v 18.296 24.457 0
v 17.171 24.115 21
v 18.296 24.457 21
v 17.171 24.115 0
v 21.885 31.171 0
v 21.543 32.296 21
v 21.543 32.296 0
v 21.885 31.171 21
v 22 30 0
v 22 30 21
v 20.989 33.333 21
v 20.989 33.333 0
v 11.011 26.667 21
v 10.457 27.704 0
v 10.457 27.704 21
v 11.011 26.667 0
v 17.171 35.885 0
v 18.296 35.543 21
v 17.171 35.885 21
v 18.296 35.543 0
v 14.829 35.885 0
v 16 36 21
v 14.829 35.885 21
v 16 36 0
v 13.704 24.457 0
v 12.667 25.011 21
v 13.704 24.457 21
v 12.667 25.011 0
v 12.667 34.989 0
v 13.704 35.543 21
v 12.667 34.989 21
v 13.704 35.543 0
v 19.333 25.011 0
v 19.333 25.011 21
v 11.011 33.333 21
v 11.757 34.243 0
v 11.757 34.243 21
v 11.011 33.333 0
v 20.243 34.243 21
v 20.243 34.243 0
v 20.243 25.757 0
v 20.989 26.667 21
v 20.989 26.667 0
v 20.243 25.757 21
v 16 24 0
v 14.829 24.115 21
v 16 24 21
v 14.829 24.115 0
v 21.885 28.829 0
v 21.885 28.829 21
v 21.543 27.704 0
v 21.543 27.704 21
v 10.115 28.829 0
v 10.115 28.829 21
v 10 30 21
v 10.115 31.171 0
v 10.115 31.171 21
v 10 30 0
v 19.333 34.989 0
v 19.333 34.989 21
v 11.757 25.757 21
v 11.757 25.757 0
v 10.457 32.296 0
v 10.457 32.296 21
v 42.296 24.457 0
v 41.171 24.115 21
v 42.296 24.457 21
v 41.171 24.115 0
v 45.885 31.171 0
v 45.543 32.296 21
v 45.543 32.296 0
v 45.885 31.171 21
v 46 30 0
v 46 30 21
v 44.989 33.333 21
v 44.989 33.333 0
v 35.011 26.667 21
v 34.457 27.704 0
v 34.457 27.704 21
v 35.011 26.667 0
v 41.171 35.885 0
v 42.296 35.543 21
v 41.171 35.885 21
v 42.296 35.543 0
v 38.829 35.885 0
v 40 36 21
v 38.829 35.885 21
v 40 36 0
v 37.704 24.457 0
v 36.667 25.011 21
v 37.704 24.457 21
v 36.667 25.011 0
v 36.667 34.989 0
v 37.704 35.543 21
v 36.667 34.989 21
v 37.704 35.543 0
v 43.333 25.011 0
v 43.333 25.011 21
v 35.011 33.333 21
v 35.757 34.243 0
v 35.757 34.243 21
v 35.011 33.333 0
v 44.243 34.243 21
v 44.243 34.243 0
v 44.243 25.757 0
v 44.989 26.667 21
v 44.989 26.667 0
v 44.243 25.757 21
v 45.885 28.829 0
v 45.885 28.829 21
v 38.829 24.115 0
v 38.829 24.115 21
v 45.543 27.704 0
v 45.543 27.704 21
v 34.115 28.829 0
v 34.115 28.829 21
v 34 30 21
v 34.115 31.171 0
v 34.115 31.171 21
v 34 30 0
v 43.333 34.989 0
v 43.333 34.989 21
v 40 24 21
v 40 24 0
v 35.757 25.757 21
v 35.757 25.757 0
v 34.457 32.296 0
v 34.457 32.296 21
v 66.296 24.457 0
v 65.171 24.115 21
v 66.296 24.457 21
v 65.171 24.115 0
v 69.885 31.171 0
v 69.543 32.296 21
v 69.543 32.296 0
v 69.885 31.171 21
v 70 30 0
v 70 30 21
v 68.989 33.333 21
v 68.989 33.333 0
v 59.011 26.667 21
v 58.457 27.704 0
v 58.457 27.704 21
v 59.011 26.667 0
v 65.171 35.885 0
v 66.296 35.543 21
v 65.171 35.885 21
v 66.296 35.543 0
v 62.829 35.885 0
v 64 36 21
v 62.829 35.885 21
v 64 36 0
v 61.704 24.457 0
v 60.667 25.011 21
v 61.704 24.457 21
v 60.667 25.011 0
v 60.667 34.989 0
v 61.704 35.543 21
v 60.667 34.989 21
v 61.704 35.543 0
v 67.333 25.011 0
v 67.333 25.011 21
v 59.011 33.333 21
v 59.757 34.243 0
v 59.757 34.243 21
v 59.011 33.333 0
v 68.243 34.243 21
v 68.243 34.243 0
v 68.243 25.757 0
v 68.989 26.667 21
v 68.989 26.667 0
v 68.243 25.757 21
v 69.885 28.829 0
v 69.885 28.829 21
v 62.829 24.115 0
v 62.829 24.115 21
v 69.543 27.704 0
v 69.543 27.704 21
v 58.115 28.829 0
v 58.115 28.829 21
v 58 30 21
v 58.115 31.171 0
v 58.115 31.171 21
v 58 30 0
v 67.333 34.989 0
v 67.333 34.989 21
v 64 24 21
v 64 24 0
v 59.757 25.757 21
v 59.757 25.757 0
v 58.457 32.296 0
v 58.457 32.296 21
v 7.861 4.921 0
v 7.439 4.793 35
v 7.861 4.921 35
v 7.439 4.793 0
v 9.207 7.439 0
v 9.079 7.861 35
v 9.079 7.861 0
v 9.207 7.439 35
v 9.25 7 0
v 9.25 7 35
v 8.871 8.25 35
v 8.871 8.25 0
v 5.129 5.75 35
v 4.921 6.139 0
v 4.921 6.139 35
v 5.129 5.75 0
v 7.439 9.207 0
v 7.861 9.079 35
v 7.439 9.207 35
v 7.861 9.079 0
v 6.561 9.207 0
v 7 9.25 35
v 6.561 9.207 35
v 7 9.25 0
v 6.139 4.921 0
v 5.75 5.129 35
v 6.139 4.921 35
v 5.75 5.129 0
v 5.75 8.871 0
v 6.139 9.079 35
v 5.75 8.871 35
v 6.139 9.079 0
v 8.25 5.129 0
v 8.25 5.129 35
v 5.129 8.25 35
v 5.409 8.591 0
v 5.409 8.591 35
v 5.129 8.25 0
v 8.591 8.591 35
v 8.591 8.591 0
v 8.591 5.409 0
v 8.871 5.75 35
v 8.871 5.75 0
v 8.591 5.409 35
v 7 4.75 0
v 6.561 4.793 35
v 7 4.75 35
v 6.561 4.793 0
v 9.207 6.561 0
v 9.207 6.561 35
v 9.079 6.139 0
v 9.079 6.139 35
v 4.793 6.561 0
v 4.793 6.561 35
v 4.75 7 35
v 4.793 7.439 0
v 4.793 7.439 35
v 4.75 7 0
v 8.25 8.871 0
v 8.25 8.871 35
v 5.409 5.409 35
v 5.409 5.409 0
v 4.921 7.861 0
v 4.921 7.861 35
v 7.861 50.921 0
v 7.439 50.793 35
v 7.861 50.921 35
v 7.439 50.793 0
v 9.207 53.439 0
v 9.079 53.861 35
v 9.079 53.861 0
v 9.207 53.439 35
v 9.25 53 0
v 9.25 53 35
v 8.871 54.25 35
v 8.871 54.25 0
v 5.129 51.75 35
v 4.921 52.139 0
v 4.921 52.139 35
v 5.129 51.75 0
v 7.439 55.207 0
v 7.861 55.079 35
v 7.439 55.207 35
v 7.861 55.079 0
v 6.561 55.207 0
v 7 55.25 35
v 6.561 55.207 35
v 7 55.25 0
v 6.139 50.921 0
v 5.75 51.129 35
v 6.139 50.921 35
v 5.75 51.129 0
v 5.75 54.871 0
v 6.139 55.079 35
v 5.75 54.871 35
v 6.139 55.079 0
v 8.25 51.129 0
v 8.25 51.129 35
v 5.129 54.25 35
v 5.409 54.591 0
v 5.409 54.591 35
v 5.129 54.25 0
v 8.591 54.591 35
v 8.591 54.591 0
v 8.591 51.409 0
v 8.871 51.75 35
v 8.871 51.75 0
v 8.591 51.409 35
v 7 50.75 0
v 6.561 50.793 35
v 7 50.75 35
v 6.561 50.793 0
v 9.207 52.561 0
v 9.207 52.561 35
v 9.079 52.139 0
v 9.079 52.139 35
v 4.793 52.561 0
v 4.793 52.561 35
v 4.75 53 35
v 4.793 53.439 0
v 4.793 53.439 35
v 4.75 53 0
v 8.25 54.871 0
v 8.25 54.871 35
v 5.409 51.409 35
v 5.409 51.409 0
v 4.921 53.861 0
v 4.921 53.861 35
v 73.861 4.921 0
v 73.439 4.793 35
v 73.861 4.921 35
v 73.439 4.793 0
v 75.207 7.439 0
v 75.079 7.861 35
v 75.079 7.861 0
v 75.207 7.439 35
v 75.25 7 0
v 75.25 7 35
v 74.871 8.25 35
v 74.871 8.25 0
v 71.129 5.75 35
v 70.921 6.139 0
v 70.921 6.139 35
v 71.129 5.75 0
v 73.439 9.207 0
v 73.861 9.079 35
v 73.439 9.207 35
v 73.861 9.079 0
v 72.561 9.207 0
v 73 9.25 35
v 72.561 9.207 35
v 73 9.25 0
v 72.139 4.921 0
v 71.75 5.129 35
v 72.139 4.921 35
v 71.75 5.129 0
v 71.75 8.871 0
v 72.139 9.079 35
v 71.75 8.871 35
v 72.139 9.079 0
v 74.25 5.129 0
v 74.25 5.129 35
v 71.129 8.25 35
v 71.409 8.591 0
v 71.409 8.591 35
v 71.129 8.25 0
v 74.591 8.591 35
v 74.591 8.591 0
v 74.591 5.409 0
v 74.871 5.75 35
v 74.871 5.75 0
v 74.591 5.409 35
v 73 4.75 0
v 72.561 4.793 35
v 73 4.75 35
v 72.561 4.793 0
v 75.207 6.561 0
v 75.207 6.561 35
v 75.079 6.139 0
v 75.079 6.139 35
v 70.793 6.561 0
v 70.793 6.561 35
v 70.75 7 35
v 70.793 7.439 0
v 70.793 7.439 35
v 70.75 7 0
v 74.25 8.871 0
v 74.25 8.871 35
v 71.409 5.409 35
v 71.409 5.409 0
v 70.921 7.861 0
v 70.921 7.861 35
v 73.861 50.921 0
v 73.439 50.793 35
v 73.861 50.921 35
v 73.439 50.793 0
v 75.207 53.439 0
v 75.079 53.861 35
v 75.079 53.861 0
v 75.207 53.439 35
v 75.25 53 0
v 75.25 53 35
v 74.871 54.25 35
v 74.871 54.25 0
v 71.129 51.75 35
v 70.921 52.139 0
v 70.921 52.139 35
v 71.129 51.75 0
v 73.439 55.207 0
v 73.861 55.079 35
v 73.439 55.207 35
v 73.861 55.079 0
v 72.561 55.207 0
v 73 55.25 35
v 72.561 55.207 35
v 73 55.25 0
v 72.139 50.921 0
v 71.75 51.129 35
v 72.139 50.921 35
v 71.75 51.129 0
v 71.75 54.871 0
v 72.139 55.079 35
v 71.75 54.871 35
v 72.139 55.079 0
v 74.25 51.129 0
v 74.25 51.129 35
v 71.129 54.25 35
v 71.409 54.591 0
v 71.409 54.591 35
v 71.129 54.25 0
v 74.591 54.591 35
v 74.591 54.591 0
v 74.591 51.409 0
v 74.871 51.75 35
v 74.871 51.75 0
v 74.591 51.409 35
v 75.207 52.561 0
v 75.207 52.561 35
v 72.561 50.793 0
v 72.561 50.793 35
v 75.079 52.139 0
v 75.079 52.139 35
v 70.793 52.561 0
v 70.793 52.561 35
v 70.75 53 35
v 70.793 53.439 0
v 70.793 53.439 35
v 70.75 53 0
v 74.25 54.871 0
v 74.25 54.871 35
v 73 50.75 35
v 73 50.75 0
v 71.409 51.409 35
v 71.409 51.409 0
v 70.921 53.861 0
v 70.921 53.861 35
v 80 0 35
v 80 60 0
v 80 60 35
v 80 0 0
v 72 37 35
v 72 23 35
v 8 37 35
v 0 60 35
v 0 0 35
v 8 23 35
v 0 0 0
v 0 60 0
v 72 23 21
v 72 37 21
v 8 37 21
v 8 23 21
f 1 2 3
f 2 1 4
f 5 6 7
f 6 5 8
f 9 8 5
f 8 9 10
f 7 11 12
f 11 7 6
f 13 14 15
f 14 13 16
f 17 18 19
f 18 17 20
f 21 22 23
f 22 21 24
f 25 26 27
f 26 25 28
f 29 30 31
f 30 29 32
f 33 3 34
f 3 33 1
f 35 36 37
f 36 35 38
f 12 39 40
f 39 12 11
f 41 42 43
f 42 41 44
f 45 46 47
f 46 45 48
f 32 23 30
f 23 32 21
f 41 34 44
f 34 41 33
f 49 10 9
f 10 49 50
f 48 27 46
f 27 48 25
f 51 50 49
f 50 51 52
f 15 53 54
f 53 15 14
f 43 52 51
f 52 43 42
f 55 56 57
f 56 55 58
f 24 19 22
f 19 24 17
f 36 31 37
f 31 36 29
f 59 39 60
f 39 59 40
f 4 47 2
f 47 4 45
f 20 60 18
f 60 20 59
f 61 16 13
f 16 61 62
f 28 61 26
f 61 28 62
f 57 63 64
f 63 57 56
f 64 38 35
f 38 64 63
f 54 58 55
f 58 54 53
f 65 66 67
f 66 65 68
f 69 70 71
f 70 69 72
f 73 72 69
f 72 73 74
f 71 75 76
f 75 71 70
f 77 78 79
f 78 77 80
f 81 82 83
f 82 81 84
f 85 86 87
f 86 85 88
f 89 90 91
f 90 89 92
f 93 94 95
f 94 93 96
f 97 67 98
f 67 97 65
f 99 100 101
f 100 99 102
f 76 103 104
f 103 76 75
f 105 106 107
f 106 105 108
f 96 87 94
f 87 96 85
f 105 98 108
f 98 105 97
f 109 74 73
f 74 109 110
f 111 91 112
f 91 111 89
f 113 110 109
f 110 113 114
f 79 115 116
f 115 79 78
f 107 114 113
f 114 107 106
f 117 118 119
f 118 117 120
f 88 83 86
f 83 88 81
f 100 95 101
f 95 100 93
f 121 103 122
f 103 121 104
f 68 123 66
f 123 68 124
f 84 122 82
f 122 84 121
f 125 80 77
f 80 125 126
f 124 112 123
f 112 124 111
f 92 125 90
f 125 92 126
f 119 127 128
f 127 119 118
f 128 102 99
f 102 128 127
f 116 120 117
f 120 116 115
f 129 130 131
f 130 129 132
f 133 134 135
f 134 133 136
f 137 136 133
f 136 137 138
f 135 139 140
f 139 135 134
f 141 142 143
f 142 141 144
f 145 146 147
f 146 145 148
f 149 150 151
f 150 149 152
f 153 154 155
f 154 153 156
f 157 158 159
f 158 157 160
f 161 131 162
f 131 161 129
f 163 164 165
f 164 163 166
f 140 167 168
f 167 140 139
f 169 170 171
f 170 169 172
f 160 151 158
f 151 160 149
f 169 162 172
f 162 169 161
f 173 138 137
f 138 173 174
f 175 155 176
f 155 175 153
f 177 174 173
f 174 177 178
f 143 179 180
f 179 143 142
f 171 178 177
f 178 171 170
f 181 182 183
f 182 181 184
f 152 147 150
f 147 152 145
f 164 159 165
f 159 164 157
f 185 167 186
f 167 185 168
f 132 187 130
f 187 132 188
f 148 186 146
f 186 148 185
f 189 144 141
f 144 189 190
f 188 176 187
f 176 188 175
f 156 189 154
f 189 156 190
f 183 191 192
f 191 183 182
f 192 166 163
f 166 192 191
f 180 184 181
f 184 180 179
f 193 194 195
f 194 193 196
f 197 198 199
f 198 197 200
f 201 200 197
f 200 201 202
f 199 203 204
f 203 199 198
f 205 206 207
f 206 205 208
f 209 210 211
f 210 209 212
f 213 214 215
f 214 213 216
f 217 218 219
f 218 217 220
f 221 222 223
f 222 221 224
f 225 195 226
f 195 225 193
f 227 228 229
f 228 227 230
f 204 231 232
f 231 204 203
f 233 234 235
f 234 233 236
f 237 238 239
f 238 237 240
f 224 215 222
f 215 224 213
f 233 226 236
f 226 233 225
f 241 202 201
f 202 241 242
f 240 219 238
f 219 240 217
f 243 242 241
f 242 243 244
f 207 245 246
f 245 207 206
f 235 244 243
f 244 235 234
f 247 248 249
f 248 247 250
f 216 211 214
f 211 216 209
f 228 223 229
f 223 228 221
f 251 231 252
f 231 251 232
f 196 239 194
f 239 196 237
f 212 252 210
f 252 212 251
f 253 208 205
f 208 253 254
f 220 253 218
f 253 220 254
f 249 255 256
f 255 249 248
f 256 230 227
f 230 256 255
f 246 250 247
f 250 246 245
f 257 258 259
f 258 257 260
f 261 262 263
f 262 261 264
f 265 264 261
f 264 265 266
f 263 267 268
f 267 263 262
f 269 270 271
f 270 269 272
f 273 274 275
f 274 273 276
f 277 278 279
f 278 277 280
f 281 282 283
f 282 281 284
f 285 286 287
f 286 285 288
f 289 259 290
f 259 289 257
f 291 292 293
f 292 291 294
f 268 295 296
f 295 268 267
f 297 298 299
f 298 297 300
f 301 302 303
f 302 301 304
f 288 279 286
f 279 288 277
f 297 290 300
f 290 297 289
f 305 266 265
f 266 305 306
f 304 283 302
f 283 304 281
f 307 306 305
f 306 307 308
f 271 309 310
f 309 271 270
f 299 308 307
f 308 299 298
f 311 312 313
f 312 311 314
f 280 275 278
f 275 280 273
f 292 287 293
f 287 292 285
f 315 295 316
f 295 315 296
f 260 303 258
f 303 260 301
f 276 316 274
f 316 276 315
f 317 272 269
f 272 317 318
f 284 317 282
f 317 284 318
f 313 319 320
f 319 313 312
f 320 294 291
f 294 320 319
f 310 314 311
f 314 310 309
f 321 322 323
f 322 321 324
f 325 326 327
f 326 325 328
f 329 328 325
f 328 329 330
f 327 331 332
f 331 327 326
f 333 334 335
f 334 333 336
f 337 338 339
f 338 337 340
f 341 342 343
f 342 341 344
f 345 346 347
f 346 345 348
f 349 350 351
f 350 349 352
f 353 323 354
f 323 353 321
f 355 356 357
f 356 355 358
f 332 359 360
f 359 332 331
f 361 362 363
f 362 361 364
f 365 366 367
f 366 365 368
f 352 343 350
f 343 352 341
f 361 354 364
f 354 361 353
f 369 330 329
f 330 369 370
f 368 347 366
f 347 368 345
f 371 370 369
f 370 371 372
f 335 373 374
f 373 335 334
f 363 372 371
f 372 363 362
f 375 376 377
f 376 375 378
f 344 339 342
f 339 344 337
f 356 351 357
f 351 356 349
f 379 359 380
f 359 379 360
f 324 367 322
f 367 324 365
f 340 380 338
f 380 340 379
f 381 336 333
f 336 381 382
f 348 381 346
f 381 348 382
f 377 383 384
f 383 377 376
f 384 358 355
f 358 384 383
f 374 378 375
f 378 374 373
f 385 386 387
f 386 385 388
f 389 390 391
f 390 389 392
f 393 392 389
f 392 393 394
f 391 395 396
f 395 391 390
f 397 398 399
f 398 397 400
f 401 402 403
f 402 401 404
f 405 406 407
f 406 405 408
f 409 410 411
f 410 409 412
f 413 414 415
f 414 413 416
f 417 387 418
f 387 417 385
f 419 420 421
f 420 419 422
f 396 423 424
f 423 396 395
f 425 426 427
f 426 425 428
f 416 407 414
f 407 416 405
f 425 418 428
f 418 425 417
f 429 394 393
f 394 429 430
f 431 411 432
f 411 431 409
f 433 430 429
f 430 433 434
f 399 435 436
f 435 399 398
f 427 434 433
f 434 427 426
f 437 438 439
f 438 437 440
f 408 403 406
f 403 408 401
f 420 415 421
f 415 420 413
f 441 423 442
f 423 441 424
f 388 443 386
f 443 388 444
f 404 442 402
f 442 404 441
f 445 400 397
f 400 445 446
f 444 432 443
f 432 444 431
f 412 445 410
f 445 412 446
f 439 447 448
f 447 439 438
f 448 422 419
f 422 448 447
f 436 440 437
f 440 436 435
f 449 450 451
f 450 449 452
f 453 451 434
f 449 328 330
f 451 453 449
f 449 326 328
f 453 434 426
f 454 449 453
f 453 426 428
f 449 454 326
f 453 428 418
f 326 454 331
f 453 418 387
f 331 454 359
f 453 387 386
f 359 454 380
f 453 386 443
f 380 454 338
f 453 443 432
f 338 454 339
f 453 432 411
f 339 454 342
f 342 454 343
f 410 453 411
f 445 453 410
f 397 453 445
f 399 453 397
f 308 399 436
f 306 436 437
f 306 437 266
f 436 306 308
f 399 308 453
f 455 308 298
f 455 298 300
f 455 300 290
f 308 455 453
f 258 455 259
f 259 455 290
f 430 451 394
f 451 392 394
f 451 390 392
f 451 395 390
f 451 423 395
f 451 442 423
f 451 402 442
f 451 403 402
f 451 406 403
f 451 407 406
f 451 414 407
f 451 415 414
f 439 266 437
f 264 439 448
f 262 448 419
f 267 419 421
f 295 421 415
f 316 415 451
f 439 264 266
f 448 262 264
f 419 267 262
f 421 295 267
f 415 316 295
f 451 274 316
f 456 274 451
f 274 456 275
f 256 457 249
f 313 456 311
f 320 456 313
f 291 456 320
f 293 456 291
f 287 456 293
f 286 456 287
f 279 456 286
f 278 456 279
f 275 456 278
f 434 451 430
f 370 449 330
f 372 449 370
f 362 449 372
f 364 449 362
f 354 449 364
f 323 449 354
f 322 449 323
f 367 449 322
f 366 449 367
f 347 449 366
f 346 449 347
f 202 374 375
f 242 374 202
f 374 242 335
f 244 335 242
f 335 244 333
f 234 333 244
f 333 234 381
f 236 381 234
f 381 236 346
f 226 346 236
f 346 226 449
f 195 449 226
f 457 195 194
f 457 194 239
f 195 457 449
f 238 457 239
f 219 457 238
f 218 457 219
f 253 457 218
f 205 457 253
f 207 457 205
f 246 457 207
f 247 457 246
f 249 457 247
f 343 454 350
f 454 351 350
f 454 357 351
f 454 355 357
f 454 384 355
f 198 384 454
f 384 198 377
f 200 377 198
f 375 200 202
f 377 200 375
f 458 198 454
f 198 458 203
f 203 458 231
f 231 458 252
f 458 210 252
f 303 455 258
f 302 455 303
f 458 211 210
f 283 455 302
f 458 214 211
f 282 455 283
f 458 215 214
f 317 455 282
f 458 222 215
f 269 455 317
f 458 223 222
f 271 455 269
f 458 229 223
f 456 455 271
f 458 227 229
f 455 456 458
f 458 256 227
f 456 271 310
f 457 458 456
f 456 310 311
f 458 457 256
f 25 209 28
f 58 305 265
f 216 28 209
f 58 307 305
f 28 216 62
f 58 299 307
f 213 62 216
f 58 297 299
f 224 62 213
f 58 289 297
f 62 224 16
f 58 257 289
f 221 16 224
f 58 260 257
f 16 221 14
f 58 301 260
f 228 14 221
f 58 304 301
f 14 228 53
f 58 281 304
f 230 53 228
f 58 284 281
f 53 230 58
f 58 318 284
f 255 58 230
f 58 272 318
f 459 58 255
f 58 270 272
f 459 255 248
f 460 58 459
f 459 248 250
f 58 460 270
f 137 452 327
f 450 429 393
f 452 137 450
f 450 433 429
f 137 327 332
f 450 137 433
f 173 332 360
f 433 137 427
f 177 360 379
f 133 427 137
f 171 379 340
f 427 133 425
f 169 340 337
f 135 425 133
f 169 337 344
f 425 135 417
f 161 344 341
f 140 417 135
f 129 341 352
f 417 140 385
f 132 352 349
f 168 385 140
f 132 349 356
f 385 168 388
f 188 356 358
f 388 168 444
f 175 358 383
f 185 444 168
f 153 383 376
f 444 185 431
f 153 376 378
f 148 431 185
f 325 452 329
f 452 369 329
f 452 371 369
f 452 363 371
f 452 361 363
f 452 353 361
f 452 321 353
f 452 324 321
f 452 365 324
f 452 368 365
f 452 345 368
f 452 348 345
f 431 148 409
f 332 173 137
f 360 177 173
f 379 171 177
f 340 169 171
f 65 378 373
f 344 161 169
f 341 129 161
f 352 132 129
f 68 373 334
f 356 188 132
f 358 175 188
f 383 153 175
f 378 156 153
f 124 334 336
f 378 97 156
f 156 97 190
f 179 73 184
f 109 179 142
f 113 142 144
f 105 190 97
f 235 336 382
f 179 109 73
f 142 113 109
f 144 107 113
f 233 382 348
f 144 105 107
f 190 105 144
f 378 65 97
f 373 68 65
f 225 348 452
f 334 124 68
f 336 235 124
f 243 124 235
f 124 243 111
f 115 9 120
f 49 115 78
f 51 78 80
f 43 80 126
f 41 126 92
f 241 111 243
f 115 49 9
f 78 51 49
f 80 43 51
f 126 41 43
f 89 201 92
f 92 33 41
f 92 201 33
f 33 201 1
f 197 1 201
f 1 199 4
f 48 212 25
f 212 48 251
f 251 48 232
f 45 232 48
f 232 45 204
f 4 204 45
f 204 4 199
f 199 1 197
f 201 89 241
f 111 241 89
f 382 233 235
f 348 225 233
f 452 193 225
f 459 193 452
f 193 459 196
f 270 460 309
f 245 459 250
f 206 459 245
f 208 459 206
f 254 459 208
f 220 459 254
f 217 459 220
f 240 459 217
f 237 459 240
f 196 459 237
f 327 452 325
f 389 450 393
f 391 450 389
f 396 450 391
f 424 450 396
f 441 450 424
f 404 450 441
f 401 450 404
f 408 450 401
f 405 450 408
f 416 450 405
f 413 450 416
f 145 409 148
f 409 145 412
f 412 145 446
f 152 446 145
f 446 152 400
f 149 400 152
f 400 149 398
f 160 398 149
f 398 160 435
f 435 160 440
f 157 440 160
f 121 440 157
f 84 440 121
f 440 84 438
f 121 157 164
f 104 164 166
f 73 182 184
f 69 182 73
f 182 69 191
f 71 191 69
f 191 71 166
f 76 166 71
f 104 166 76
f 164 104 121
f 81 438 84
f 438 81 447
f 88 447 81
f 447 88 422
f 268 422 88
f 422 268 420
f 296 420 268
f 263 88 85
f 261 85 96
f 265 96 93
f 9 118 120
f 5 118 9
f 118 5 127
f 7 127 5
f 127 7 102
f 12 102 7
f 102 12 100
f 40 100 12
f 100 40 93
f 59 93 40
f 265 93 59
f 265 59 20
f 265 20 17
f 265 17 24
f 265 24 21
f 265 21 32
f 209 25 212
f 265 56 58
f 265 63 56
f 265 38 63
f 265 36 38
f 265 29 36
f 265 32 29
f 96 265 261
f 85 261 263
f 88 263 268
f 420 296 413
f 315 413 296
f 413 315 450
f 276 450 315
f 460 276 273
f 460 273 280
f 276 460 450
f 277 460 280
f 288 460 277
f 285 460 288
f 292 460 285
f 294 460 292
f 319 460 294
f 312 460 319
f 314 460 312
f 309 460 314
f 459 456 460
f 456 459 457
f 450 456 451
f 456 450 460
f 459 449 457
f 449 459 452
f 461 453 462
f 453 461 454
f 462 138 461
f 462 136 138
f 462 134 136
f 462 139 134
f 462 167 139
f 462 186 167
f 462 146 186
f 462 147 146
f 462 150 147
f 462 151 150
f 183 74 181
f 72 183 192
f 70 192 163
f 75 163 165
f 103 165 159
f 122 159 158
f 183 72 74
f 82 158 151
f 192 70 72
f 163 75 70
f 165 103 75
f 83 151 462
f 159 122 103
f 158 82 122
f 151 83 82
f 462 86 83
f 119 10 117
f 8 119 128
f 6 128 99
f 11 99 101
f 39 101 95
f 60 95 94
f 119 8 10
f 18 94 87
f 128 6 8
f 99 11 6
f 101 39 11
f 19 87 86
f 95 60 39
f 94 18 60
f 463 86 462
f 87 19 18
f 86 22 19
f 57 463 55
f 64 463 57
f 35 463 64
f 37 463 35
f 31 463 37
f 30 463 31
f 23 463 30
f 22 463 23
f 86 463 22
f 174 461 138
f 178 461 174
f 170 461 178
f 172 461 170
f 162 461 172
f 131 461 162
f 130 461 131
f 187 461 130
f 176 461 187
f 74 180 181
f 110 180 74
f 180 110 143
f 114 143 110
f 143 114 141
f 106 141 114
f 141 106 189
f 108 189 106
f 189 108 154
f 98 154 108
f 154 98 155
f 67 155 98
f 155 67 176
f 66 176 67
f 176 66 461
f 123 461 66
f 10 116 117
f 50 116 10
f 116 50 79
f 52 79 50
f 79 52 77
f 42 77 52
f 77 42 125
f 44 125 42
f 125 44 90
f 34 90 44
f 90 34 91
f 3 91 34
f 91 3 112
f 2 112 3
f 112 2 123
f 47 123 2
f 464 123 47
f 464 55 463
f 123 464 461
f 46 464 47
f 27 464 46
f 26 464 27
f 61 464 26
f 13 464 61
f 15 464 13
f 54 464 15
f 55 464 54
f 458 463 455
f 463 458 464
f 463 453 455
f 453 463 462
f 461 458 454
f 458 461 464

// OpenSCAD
$fn = 32;

// ----------------------------------------------------------------------
// Manifold block: gallery_top manifold
// ----------------------------------------------------------------------

// --- parameters (mm) ---
block_l = 80;             // block length, X
block_w = 60;             // block width, Y
block_h = 35;             // block height, Z
port_d = 12;              // port bore diameter
port_pitch = 24;          // port pitch along X
gallery_d = 14;           // top gallery width, Y
gallery_depth = 14;       // gallery pocket depth
wall_p = 8;               // gallery end wall thickness, X
mnt_d = 4.5;              // mounting hole diameter
mnt_in = 7;               // mounting hole inset from the edges

n_ports = 3;  // ports in the row
port_x0 = (block_l - (n_ports - 1) * port_pitch) / 2;  // first port X

difference() {
  cube([block_l, block_w, block_h]);
  for (i = [0 : n_ports - 1])
    translate([port_x0 + i * port_pitch, block_w / 2, -1])
      cylinder(h = block_h + 2, d = port_d);
  translate([wall_p, block_w / 2 - gallery_d / 2, block_h - gallery_depth])
    cube([block_l - 2 * wall_p, gallery_d, gallery_depth + 1]);
  for (cx = [mnt_in, block_l - mnt_in])
    for (cy = [mnt_in, block_w - mnt_in])
      translate([cx, cy, -1]) cylinder(h = block_h + 2, d = mnt_d);
}
